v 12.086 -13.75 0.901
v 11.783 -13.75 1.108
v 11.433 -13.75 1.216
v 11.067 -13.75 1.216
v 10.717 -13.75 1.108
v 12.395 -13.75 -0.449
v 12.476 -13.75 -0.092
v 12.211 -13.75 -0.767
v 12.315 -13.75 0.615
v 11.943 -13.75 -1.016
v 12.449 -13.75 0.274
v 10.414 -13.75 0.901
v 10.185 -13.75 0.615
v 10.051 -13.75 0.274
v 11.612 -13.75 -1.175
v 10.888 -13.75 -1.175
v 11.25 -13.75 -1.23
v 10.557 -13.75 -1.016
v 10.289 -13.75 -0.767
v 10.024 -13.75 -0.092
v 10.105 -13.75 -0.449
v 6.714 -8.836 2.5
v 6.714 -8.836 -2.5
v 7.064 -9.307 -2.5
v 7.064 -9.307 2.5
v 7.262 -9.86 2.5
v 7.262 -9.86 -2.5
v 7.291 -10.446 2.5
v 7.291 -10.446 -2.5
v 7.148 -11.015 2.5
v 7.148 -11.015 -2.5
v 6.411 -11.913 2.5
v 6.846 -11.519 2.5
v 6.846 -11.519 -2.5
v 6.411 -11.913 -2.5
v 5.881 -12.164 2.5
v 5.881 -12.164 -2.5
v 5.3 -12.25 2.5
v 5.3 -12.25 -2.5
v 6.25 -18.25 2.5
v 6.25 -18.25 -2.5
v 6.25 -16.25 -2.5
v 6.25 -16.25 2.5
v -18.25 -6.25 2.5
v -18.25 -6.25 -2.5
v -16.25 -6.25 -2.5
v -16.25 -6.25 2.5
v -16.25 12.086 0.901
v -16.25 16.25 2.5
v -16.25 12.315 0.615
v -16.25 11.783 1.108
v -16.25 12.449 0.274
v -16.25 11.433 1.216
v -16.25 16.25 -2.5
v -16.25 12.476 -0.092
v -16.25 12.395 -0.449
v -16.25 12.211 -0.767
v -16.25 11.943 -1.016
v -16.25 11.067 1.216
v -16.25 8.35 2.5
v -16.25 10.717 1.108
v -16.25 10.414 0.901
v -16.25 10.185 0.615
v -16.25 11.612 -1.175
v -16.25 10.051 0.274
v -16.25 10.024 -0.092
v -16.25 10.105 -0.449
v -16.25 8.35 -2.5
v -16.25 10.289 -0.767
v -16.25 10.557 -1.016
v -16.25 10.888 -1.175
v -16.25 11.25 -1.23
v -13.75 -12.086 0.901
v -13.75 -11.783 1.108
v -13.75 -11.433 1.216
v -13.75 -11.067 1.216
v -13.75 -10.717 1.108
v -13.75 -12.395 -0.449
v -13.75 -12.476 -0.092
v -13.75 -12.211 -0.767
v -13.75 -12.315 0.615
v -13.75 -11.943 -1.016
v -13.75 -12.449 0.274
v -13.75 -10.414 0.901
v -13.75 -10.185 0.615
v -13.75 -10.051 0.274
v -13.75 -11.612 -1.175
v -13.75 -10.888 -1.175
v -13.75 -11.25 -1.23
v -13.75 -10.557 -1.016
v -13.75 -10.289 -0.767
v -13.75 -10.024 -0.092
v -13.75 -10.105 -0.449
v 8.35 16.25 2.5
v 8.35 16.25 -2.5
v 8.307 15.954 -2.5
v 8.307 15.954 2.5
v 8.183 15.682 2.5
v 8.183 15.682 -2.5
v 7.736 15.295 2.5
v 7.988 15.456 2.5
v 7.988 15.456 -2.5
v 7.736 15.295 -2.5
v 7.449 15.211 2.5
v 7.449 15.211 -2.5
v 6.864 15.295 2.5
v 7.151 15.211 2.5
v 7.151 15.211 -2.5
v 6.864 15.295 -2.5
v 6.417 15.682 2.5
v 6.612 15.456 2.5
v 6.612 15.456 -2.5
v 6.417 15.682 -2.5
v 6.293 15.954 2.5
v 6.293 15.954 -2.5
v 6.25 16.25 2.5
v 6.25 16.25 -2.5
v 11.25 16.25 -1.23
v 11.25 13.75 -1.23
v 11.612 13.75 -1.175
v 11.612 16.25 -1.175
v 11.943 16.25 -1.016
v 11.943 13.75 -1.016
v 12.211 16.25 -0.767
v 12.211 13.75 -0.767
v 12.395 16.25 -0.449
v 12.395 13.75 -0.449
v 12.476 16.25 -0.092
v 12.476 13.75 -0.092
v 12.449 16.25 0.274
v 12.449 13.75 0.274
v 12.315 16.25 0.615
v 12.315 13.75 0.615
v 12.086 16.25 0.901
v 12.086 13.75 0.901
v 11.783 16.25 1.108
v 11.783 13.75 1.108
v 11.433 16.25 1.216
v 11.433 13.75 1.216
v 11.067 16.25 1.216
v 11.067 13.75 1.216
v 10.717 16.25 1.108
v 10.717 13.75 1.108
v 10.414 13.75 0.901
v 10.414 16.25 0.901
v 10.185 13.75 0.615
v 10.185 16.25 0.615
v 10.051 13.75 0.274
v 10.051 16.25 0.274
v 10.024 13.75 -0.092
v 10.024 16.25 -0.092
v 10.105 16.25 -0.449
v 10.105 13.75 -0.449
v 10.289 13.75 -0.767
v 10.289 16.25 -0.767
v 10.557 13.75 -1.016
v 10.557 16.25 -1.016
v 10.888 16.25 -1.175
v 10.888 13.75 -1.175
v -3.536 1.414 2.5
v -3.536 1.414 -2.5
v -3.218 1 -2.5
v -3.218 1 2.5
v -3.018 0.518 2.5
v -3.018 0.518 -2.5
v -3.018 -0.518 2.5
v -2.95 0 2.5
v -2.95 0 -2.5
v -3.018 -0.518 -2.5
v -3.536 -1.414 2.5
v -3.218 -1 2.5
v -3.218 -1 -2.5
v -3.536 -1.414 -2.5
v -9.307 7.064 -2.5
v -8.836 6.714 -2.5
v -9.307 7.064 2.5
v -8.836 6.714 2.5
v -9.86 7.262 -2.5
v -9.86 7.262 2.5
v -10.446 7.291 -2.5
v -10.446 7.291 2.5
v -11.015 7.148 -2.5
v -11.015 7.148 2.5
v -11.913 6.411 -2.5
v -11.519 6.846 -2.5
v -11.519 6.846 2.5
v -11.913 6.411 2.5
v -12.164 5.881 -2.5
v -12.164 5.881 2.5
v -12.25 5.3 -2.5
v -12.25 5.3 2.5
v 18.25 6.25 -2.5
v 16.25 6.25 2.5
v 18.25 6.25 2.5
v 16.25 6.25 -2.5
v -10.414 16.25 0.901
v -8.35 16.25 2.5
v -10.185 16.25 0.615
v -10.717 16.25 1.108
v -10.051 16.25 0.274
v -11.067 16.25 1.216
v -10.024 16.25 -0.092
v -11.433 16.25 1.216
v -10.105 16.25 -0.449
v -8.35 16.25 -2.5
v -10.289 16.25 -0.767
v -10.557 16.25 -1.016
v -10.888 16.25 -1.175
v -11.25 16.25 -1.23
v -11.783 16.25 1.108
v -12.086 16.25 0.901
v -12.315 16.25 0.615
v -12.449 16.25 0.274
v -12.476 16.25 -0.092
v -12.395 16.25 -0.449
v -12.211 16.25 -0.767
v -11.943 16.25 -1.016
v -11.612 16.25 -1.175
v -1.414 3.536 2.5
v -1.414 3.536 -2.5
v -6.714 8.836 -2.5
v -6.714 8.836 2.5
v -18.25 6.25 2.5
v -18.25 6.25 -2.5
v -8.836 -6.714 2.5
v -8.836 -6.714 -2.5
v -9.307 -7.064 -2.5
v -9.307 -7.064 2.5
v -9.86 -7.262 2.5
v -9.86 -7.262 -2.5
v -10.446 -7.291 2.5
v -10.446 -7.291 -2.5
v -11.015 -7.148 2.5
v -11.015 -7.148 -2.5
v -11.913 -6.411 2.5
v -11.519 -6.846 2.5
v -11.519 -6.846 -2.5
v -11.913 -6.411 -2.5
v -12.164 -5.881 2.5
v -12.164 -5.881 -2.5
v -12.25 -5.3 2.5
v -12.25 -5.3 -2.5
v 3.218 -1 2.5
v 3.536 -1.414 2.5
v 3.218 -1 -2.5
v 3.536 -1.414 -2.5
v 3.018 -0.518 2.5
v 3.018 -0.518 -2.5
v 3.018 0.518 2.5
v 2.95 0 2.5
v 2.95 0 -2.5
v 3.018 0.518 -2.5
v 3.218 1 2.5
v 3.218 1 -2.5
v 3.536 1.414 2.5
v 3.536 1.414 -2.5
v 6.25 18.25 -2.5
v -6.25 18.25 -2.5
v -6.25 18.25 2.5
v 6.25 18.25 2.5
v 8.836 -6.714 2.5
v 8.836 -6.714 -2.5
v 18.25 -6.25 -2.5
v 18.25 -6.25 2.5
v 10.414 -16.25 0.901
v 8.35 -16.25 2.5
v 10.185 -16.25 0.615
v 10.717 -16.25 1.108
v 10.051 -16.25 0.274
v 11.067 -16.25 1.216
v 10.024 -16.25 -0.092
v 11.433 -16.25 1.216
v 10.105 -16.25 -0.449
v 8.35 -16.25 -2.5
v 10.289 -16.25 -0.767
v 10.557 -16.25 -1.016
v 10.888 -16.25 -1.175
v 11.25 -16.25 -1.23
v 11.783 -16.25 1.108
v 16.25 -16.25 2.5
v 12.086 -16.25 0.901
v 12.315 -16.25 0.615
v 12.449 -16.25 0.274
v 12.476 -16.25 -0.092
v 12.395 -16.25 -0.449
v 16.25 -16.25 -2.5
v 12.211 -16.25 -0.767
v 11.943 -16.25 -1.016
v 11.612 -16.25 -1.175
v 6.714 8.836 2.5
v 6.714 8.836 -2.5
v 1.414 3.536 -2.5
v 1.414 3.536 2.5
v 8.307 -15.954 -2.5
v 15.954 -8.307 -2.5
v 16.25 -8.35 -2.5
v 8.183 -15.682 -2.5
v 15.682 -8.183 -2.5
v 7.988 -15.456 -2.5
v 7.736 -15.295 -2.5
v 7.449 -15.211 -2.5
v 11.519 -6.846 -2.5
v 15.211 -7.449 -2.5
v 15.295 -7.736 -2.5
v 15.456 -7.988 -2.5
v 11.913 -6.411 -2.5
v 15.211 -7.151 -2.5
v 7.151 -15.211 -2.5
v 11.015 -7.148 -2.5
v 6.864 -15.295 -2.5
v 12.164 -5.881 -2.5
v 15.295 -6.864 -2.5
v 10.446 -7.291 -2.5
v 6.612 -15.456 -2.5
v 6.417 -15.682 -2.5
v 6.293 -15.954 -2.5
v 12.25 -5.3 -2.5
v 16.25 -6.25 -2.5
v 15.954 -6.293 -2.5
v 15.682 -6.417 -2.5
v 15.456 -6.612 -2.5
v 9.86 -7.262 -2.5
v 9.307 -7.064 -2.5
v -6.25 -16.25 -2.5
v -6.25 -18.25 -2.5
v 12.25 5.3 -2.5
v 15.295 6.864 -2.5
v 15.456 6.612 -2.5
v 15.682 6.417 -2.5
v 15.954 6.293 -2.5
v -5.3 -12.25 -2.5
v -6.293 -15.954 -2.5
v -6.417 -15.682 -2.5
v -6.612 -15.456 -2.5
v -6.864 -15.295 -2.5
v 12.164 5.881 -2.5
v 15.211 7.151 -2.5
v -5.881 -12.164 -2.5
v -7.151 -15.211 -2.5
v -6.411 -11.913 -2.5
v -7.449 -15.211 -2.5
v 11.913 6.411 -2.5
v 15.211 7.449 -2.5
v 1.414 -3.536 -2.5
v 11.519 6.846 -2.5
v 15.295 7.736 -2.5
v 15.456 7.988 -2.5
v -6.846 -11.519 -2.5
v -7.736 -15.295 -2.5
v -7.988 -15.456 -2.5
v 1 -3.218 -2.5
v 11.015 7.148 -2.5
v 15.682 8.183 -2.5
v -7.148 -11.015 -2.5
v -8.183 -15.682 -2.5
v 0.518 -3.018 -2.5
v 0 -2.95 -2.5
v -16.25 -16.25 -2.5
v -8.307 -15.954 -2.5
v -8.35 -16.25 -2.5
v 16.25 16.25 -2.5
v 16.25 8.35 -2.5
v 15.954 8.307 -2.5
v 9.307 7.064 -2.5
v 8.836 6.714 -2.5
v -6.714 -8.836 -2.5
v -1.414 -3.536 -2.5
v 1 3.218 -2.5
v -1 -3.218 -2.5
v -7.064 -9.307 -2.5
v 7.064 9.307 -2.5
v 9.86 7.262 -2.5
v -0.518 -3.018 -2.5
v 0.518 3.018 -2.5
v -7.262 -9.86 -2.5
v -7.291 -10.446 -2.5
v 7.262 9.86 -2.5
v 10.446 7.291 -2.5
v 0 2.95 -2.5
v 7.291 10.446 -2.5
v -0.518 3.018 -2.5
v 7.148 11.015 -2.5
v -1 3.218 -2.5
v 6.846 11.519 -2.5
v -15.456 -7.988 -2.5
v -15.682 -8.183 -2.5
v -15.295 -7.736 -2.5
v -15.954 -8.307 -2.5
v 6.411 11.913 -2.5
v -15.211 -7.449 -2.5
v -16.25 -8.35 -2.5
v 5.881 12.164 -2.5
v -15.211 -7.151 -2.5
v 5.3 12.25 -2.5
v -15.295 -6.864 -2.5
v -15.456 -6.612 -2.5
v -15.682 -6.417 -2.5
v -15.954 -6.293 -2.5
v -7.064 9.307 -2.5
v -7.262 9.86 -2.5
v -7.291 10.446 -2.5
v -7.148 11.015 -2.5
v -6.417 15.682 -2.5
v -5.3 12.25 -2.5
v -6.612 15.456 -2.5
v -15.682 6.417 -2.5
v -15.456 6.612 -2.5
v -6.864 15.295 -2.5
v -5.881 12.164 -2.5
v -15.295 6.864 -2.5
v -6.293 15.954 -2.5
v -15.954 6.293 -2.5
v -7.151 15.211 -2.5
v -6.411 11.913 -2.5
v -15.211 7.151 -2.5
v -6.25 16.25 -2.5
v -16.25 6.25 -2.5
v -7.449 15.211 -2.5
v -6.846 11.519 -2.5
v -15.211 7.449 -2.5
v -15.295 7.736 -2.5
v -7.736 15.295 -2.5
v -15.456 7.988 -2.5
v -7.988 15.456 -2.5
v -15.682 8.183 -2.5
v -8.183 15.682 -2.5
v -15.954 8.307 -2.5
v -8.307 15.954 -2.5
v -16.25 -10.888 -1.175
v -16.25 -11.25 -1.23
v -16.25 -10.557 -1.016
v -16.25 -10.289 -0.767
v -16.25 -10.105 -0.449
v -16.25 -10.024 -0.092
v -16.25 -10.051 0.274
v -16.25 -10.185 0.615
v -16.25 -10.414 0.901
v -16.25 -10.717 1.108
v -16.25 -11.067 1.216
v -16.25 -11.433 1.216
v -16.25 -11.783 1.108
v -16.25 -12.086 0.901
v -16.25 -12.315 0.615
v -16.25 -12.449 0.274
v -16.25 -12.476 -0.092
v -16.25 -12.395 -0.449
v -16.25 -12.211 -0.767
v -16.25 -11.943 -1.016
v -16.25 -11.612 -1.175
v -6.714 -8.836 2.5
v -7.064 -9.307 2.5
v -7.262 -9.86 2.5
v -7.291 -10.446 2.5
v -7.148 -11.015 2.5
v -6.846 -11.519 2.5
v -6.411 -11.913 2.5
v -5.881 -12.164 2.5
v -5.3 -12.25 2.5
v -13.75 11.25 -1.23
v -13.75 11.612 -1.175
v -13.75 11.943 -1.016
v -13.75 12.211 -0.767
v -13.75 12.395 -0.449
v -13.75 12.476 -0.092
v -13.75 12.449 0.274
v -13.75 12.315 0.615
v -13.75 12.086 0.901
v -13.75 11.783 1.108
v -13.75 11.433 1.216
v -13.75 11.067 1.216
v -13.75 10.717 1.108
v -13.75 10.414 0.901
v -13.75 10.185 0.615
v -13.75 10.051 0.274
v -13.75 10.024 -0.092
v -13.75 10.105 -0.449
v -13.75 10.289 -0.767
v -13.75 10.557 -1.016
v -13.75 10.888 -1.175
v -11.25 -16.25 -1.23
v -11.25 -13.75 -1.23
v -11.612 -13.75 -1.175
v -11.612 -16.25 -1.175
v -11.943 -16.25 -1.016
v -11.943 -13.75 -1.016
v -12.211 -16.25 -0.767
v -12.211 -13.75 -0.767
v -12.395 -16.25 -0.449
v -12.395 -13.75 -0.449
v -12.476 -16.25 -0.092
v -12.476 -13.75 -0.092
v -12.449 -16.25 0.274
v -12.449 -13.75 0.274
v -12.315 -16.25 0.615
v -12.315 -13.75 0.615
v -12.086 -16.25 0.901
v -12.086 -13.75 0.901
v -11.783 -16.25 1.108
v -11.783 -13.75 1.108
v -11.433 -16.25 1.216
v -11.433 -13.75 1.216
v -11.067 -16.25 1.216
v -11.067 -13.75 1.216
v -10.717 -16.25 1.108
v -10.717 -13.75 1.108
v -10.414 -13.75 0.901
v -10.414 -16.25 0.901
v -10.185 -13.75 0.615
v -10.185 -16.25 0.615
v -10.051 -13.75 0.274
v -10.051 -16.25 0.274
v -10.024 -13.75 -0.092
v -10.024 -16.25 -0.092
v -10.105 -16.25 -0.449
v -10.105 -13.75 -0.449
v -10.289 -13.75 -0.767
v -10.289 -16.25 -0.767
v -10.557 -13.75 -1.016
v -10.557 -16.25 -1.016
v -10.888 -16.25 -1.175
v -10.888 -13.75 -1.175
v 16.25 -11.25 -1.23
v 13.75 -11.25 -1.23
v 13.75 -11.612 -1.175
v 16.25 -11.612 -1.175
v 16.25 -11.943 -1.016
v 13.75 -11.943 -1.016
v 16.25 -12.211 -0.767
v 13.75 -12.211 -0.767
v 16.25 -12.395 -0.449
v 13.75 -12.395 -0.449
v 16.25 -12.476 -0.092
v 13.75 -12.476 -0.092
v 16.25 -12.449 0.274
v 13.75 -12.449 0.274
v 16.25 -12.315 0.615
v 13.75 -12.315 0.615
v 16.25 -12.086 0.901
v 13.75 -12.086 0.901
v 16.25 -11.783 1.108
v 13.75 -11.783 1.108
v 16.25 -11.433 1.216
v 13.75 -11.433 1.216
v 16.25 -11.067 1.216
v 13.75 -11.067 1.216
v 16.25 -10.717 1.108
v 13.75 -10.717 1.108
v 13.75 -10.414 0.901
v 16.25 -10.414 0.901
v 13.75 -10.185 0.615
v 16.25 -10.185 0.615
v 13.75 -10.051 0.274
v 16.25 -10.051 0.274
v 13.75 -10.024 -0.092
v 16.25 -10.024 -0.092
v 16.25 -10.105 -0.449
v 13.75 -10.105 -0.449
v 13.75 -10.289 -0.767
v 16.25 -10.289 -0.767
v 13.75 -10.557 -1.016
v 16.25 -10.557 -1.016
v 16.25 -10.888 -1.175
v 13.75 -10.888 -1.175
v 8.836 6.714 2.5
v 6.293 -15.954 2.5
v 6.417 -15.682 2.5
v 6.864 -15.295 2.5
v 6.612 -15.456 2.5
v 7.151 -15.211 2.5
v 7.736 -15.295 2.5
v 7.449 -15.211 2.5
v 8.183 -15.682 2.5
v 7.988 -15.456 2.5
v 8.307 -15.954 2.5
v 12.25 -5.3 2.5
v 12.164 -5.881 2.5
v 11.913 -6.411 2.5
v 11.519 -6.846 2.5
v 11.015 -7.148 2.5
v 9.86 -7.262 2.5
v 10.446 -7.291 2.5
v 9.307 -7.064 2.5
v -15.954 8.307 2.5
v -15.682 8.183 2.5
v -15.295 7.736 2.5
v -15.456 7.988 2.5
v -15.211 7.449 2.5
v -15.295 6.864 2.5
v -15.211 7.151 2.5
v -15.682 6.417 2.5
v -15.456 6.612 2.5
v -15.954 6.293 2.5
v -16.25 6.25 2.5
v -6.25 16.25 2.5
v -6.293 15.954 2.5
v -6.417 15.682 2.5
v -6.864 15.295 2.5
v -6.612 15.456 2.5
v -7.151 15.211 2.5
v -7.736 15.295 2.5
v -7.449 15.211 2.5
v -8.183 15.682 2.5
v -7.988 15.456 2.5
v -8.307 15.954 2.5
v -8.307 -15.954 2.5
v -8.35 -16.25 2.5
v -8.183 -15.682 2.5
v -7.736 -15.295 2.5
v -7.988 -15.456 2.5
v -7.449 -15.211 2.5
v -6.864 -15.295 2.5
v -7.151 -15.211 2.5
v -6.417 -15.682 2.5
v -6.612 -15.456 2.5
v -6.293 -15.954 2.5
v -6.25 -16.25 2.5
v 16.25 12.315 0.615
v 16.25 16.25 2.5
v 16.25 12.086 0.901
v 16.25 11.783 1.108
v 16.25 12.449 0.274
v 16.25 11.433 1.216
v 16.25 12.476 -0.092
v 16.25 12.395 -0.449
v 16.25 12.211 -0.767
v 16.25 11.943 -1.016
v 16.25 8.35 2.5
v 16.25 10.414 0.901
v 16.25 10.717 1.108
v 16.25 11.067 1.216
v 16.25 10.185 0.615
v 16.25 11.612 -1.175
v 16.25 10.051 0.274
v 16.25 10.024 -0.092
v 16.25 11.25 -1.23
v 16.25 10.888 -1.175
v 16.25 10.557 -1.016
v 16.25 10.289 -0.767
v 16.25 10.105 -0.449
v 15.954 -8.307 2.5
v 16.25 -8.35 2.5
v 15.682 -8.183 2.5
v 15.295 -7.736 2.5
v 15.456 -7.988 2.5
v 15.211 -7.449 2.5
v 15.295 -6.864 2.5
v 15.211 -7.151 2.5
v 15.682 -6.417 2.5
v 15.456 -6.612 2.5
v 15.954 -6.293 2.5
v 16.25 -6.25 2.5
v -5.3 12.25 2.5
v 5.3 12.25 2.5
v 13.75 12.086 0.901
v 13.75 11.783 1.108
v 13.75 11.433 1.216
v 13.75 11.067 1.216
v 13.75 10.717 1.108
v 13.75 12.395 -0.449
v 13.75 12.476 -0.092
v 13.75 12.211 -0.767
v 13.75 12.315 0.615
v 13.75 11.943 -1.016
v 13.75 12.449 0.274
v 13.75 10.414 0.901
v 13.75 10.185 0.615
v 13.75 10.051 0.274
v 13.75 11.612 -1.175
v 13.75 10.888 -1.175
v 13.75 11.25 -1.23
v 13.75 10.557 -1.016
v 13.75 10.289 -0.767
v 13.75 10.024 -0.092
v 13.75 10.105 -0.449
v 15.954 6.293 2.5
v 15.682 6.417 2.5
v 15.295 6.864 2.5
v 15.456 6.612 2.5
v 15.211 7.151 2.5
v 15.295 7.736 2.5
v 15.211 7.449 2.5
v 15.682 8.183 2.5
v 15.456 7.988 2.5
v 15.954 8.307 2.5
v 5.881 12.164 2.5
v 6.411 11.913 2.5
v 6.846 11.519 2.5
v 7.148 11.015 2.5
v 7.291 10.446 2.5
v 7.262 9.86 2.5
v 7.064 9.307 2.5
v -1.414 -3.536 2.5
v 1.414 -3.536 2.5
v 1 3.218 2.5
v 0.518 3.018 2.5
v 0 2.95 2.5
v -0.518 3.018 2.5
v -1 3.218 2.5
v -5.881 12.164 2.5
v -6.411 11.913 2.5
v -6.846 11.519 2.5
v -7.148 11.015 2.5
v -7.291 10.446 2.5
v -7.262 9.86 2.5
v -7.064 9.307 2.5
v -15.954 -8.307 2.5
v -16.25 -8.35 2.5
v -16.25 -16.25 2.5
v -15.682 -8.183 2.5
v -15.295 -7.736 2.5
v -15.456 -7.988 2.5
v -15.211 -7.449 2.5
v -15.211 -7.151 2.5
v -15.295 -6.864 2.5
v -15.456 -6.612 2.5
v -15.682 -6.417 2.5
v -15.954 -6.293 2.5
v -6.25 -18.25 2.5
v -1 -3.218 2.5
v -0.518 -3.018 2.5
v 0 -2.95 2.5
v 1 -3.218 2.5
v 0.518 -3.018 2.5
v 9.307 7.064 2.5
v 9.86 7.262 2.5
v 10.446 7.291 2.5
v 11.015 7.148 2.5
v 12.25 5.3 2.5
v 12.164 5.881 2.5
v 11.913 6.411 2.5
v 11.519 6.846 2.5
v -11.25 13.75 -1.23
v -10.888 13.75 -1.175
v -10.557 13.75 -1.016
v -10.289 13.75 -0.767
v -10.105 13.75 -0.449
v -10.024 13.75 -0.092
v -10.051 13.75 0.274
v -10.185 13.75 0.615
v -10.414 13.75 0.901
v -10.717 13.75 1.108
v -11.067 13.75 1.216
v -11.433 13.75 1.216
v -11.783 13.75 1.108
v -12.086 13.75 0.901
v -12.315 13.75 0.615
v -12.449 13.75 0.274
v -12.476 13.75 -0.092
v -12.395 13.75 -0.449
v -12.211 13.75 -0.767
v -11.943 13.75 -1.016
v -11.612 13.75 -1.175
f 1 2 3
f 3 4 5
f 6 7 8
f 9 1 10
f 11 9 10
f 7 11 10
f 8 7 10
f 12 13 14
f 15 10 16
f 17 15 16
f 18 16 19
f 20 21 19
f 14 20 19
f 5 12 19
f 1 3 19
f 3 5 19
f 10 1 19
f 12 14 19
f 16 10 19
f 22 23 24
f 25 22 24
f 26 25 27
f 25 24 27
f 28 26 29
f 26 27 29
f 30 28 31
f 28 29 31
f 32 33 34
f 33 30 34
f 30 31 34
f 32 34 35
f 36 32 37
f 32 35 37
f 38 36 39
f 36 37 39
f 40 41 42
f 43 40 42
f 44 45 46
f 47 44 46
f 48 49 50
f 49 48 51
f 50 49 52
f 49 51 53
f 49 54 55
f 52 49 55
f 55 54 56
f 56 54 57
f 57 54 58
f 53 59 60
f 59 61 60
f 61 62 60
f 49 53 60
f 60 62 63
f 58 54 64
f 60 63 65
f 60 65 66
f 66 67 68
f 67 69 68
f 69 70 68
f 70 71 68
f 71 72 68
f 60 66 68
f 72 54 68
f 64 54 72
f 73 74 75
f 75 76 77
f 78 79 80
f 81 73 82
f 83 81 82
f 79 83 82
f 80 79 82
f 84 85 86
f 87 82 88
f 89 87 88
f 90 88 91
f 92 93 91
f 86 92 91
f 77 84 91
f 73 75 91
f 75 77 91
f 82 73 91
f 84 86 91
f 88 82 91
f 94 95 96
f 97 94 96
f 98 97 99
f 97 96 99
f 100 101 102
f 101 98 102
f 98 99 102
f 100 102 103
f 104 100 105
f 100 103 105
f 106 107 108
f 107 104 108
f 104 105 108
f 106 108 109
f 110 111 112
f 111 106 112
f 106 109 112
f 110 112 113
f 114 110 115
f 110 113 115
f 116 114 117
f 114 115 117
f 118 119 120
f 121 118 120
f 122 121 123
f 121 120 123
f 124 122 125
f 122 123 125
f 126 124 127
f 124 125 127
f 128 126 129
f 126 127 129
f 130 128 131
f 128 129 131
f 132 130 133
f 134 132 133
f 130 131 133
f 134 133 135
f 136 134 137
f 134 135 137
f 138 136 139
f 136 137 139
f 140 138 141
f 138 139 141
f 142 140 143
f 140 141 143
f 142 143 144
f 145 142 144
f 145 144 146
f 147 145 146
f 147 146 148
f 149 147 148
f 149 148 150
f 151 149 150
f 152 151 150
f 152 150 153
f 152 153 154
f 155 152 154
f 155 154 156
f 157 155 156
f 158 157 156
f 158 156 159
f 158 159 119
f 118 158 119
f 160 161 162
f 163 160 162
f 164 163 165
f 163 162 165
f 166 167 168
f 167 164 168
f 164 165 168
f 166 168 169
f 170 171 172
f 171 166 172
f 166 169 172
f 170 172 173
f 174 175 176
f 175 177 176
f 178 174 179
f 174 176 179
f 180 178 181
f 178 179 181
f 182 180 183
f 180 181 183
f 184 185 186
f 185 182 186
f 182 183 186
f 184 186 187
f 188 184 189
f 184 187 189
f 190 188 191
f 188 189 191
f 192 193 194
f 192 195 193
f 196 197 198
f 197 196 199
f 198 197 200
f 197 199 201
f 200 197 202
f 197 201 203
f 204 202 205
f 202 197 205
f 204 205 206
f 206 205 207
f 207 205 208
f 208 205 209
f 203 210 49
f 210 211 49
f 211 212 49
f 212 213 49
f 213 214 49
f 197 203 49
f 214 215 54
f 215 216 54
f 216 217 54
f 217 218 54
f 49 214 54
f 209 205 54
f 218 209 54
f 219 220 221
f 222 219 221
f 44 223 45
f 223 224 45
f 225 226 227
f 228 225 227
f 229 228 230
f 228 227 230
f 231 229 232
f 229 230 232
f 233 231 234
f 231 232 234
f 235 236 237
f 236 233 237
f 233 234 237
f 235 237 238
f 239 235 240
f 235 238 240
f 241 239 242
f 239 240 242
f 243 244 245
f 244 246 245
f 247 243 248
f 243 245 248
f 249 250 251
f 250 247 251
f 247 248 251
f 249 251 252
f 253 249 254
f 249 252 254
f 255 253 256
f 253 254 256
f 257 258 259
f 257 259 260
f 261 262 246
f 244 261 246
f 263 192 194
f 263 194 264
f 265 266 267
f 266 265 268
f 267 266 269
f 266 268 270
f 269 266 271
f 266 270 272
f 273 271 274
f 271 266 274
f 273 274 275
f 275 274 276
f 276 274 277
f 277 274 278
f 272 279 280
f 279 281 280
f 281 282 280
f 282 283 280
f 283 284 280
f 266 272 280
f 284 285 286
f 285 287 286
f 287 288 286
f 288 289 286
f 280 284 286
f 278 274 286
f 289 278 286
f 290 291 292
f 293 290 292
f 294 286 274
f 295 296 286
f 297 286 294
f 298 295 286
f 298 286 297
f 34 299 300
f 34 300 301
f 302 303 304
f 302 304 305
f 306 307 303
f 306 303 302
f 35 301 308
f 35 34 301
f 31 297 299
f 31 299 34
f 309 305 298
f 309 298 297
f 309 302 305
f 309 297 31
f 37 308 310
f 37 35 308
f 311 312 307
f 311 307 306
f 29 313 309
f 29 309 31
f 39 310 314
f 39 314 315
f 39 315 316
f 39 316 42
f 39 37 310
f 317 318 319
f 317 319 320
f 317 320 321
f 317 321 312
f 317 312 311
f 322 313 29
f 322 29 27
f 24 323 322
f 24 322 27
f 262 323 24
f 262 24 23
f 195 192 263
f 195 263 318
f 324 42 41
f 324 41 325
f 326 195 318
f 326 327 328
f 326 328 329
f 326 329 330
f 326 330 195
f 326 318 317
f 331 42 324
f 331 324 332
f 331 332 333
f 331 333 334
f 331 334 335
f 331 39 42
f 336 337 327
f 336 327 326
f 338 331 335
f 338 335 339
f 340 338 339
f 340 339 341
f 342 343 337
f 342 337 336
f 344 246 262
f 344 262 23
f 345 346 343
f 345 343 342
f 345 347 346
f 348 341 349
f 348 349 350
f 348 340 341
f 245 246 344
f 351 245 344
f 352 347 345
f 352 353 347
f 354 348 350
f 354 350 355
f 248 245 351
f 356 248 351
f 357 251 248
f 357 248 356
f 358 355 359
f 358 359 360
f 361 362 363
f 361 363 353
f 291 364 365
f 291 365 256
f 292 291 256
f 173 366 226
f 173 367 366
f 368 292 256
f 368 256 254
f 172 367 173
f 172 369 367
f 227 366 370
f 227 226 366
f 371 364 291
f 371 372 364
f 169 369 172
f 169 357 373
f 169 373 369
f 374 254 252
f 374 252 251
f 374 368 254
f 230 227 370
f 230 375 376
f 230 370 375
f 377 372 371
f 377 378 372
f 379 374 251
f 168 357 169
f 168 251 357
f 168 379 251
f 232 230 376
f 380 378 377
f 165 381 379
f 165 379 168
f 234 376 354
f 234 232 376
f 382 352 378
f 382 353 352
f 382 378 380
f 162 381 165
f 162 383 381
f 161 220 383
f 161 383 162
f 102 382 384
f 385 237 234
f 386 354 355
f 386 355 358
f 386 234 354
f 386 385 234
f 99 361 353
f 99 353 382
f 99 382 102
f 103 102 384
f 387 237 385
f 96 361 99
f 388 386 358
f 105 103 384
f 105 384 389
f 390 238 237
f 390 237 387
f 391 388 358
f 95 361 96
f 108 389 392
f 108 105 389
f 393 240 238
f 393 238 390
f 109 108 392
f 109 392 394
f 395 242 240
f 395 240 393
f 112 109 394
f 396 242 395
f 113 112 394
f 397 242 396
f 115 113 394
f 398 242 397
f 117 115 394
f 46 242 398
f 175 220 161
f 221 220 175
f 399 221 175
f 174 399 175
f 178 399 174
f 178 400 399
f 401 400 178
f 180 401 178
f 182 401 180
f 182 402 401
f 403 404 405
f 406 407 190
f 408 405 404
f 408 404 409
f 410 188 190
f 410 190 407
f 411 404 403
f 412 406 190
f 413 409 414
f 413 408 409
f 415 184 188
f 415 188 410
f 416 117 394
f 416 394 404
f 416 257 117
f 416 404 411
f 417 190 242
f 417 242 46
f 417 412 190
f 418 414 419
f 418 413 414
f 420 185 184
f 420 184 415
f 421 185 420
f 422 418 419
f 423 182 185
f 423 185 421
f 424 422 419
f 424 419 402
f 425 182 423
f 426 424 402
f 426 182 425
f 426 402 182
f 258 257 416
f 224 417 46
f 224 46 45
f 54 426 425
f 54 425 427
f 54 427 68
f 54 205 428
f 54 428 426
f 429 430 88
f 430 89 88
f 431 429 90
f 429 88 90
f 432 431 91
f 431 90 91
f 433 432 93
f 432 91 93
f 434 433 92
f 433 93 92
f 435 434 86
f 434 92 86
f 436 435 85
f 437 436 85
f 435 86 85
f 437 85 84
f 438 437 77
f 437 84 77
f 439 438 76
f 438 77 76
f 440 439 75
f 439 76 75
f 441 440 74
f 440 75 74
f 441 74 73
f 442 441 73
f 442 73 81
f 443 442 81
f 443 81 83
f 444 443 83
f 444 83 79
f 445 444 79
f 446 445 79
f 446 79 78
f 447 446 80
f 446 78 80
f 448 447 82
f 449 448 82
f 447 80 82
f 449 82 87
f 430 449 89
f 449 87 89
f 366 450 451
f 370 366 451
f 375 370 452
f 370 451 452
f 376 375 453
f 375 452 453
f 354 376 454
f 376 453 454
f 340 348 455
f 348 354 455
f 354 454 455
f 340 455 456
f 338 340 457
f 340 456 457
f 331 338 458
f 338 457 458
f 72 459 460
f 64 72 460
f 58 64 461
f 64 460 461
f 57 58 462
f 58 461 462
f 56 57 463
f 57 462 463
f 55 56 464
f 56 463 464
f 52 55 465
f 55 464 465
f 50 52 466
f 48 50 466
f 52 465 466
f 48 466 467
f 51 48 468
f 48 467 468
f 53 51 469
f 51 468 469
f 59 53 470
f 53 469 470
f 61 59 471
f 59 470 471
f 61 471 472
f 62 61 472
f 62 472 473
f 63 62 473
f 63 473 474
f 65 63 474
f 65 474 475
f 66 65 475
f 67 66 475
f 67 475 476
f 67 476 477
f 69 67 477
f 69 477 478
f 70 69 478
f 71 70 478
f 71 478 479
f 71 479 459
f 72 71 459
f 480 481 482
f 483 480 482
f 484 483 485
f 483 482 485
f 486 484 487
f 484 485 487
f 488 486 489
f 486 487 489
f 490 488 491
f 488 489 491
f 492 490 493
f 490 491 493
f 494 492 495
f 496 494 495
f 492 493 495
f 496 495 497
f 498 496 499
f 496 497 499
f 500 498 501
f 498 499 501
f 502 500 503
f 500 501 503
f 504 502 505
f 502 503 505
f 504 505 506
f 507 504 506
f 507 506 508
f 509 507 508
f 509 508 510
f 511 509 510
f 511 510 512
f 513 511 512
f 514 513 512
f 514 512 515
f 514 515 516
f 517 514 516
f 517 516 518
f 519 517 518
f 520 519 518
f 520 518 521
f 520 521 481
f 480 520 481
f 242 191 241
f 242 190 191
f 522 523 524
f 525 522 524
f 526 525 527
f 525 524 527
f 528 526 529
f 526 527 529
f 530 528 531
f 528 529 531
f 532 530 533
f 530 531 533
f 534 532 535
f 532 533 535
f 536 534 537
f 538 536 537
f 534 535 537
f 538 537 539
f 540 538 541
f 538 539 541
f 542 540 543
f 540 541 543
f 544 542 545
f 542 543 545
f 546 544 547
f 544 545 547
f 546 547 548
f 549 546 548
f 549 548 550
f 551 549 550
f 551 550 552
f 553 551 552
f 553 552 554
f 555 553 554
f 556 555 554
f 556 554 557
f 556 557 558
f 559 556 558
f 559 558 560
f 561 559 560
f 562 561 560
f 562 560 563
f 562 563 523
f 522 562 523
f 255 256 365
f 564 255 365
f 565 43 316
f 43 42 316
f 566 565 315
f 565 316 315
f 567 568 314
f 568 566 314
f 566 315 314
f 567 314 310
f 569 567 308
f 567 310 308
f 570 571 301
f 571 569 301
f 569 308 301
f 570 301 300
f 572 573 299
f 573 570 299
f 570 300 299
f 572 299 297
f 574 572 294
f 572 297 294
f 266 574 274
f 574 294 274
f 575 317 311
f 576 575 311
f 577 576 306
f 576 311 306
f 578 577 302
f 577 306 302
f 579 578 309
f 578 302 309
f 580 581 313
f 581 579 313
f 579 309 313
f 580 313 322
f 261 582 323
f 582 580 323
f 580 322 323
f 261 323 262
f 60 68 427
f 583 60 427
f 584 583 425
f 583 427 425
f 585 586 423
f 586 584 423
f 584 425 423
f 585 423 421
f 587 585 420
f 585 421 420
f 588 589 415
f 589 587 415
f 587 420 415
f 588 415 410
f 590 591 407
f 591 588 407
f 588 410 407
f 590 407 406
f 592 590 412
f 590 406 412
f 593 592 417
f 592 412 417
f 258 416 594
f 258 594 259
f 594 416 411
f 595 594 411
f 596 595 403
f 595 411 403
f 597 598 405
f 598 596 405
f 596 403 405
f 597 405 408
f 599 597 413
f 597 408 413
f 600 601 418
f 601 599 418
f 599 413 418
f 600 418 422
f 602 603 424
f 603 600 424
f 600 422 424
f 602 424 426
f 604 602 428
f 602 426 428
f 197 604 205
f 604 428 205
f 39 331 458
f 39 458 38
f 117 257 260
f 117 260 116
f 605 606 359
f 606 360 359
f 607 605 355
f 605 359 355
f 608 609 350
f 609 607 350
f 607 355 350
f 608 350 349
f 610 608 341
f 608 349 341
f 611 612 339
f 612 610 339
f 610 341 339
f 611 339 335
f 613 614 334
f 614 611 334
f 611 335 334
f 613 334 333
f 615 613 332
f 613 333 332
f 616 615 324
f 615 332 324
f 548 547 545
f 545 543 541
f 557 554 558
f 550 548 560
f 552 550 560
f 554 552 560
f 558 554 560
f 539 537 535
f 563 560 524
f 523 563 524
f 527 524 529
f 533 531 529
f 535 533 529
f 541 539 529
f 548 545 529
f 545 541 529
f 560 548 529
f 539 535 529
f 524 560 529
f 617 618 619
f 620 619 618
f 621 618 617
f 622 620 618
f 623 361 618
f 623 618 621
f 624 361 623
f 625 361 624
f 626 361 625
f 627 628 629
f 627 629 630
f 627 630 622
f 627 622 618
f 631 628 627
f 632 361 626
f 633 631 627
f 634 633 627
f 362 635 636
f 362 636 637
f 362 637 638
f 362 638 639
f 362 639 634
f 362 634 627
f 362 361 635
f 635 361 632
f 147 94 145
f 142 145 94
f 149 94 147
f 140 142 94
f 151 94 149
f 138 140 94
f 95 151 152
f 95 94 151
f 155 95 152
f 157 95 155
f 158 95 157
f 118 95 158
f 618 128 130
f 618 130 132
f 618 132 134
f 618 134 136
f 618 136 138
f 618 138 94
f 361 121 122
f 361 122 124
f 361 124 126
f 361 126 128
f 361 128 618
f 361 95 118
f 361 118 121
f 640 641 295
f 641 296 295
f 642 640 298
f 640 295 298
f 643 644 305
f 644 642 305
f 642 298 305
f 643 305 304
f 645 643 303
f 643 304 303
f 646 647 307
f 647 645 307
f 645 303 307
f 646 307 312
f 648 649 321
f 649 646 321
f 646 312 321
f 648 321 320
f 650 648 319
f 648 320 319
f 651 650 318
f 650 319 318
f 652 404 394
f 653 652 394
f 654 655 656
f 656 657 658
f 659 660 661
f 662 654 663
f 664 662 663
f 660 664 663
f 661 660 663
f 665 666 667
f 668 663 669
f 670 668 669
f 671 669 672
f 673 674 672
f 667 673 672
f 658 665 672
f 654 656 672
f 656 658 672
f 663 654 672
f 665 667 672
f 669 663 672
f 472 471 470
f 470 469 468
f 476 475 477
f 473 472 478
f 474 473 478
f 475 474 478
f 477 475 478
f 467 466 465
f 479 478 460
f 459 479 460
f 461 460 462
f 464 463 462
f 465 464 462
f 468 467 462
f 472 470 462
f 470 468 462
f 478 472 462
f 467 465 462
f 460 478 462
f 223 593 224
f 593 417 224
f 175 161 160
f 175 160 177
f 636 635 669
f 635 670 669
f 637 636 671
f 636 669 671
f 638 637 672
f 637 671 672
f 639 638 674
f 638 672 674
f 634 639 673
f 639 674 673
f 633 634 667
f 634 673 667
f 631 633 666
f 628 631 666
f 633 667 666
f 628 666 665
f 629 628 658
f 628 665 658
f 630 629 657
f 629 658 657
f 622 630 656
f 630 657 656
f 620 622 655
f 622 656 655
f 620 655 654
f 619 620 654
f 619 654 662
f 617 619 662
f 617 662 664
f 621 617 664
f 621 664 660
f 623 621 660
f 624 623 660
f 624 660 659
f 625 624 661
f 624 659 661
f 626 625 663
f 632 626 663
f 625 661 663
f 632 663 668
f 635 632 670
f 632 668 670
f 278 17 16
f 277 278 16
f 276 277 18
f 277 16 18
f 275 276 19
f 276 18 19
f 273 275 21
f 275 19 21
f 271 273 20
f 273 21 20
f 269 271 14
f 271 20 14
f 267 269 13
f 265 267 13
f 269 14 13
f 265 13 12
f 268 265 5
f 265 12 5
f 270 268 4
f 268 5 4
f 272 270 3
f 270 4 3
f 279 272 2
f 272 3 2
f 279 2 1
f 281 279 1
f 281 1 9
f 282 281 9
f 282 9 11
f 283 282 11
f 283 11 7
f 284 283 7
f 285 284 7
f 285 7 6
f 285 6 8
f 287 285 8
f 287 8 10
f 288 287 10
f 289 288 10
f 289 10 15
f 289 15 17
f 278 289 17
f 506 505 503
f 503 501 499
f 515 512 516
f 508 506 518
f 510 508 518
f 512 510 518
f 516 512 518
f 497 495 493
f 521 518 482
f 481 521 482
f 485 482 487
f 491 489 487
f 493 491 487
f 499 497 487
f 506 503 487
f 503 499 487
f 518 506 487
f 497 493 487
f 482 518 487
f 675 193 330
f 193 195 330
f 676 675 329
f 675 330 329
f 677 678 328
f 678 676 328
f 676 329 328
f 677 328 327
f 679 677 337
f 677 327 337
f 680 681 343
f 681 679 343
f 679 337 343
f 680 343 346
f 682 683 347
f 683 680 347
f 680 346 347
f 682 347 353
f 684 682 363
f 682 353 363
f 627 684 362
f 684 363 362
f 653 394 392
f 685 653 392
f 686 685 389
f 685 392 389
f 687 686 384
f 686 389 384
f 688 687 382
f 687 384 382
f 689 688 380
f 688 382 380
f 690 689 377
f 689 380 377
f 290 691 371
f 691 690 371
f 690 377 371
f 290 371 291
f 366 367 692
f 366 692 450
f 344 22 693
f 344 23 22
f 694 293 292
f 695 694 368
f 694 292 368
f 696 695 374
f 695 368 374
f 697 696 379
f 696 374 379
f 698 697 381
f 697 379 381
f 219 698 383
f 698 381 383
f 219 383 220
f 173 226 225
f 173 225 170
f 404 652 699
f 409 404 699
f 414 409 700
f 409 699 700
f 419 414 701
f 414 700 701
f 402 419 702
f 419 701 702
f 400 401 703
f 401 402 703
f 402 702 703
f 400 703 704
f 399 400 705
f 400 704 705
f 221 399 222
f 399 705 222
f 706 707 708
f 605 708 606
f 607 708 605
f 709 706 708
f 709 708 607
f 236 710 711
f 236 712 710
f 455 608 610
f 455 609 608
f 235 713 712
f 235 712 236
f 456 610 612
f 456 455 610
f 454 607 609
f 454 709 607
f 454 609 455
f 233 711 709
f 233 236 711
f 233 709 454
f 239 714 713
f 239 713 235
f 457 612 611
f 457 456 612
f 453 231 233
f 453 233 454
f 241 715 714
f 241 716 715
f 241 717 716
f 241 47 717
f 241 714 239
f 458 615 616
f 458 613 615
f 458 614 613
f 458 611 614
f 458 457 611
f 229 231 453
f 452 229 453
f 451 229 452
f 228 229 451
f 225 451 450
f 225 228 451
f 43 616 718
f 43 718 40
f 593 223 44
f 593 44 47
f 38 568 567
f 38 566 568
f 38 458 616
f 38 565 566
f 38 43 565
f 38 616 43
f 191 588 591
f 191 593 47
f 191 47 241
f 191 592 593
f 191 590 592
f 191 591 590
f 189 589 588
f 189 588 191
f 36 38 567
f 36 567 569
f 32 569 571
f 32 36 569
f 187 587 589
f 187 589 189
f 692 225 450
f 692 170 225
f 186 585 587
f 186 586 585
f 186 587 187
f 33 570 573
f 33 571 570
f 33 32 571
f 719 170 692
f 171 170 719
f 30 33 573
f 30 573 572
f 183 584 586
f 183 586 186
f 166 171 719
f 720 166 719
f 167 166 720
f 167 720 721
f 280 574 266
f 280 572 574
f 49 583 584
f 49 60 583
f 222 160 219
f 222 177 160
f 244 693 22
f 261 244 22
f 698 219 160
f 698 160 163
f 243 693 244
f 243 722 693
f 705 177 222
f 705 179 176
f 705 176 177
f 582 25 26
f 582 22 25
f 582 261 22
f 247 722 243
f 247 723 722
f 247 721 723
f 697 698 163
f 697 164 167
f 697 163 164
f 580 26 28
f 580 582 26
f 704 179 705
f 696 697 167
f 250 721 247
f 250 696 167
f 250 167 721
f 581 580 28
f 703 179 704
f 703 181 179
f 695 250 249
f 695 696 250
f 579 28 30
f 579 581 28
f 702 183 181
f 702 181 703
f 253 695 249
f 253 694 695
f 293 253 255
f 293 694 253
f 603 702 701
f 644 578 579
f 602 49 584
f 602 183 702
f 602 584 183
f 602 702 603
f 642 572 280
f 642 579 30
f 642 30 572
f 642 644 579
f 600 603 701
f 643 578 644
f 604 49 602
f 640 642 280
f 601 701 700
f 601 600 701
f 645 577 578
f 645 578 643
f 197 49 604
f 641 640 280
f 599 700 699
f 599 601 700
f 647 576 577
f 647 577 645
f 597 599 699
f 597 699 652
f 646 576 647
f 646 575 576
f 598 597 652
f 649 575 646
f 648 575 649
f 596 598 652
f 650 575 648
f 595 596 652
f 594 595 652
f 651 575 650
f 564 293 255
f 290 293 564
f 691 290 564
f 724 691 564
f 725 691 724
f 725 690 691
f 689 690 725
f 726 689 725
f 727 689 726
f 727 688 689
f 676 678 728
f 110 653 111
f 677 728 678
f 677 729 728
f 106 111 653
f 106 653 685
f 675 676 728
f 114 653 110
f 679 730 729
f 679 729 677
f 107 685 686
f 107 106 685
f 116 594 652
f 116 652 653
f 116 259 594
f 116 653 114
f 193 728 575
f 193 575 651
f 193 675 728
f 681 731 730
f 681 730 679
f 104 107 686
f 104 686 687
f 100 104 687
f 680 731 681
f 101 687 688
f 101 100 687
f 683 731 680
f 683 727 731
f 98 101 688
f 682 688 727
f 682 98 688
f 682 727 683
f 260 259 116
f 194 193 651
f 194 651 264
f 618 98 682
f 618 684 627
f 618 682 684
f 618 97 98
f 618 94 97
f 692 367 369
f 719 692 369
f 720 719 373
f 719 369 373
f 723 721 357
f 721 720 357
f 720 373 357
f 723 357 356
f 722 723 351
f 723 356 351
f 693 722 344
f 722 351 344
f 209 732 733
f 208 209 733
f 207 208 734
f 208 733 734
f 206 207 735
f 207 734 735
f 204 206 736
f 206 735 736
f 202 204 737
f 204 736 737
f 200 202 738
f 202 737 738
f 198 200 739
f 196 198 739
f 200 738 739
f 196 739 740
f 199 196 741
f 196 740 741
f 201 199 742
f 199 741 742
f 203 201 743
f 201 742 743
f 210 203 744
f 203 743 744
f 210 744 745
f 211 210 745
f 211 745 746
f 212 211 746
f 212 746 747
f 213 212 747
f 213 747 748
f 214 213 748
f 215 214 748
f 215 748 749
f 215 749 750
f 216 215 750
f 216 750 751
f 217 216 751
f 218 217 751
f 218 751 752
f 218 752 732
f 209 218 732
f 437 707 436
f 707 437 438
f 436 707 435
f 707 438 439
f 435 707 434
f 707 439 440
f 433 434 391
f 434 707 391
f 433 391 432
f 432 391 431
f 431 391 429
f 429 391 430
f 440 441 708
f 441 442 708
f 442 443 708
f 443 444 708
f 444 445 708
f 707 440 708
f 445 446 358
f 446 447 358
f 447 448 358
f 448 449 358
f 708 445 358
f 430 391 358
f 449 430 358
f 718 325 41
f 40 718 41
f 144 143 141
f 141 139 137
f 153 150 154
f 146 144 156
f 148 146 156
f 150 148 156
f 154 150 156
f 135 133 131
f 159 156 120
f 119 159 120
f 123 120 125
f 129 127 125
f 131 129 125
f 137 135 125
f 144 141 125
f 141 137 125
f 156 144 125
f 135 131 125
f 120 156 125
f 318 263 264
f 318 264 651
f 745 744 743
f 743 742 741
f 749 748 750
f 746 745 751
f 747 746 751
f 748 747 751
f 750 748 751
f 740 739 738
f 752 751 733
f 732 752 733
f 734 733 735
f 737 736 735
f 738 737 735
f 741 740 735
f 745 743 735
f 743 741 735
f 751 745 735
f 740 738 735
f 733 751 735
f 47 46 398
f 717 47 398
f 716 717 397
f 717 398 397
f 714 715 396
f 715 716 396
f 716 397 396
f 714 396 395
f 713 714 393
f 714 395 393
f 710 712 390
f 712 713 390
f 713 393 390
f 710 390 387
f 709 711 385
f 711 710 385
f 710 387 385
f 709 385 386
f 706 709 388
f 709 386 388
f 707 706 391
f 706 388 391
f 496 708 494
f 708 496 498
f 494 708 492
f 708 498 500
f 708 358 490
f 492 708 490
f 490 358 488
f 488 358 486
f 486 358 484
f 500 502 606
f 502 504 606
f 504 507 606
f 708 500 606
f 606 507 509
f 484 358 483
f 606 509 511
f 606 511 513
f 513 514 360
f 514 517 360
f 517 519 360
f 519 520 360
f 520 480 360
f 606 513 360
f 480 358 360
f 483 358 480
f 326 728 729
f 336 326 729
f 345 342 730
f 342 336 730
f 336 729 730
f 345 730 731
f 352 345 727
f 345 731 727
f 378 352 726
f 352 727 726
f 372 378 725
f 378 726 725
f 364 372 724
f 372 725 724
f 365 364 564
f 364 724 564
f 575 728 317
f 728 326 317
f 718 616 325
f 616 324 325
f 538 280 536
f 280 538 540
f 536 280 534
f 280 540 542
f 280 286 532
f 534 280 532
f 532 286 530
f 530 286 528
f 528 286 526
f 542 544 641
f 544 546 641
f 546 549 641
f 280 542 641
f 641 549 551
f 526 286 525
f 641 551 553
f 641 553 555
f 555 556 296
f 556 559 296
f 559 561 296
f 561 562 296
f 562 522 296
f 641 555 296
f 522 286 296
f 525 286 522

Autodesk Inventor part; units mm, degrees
ref_plane "YZ Plane" through (0, 0, 0) normal (1, 0, 0) x (0, 1, 0)
ref_plane "XZ Plane" through (0, 0, 0) normal (0, 1, 0) x (-1, 0, 0)
ref_plane "XY Plane" through (0, 0, 0) normal (0, 0, 1) x (1, 0, 0)
sketch "スケッチ1" plane through (0, 0, 0) normal (0, 0, 1) x (1, 0, 0)
  line L0 (-16.25, -16.25) -> (16.25, -16.25) construction
  line L1 (16.25, -16.25) -> (16.25, 16.25) construction
  line L2 (16.25, 16.25) -> (-16.25, 16.25) construction
  line L3 (-16.25, 16.25) -> (-16.25, -16.25) construction
  line L4 (-16.25, -16.25) -> (16.25, 16.25) construction
  line L5 (16.25, -16.25) -> (-16.25, 16.25) construction
  line L6 (-8.35, 16.25) -> (-16.25, 16.25)
  line L7 (-16.25, 16.25) -> (-16.25, 8.35)
  line L8 (8.35, 16.25) -> (16.25, 16.25)
  line L9 (16.25, 16.25) -> (16.25, 8.35)
  line L10 (-16.25, -8.35) -> (-16.25, -16.25)
  line L11 (-16.25, -16.25) -> (-8.35, -16.25)
  line L12 (8.35, -16.25) -> (16.25, -16.25)
  line L13 (16.25, -16.25) -> (16.25, -8.35)
  line L14 (-6.25, 16.25) -> (-6.25, 18.25)
  line L15 (-6.25, 18.25) -> (6.25, 18.25)
  line L16 (6.25, 18.25) -> (6.25, 16.25)
  arc A0 (-8.35, 16.25) -> (-6.25, 16.25) centre (-7.3, 16.25) ccw
  arc A1 (6.25, 16.25) -> (8.35, 16.25) centre (7.3, 16.25) ccw
  line L17 (0, 16.25) -> (0, 0) construction
  line L18 (0, 0) -> (16.25, 0) construction
  line L19 (-16.25, 6.25) -> (-18.25, 6.25)
  line L20 (-18.25, 6.25) -> (-18.25, -6.25)
  line L21 (-18.25, -6.25) -> (-16.25, -6.25)
  arc A2 (-16.25, 6.25) -> (-16.25, 8.35) centre (-16.25, 7.3) ccw
  arc A3 (-16.25, -8.35) -> (-16.25, -6.25) centre (-16.25, -7.3) ccw
  line L22 (-6.25, -16.25) -> (-6.25, -18.25)
  line L23 (-6.25, -18.25) -> (6.25, -18.25)
  line L24 (6.25, -18.25) -> (6.25, -16.25)
  arc A4 (-6.25, -16.25) -> (-8.35, -16.25) centre (-7.3, -16.25) ccw
  arc A5 (8.35, -16.25) -> (6.25, -16.25) centre (7.3, -16.25) ccw
  line L25 (16.25, 6.25) -> (18.25, 6.25)
  line L26 (18.25, 6.25) -> (18.25, -6.25)
  line L27 (18.25, -6.25) -> (16.25, -6.25)
  arc A6 (16.25, 8.35) -> (16.25, 6.25) centre (16.25, 7.3) ccw
  arc A7 (16.25, -6.25) -> (16.25, -8.35) centre (16.25, -7.3) ccw
  line L28 (-12.8, 16.25) -> (-9.7, 16.25) construction
  line L29 (-9.7, 16.25) -> (-9.7, 13.25) construction
  line L30 (-9.7, 13.25) -> (-12.8, 13.25) construction
  line L31 (-12.8, 13.25) -> (-12.8, 16.25) construction
  line L32 (-16.25, 12.8) -> (-13.25, 12.8) construction
  line L33 (-13.25, 12.8) -> (-13.25, 9.7) construction
  line L34 (-13.25, 9.7) -> (-16.25, 9.7) construction
  line L35 (-16.25, 9.7) -> (-16.25, 12.8) construction
  line L36 (-10.1287, 12.25) -> (10.1287, 12.25)
  line L37 (10.1287, 12.25) -> (0, 2.1213)
  line L38 (0, 2.1213) -> (-10.1287, 12.25)
  line L39 (-12.25, 10.1287) -> (-12.25, -10.1287)
  line L40 (-12.25, -10.1287) -> (-2.1213, 0)
  line L41 (-2.1213, 0) -> (-12.25, 10.1287)
  line L42 (-10.1287, -12.25) -> (10.1287, -12.25)
  line L43 (10.1287, -12.25) -> (0, -2.1213)
  line L44 (0, -2.1213) -> (-10.1287, -12.25)
  line L45 (12.25, 10.1287) -> (12.25, -10.1287)
  line L46 (12.25, -10.1287) -> (2.1213, 0)
  line L47 (2.1213, 0) -> (12.25, 10.1287)
  line L48 (-11.25, 16.25) -> (-11.25, 13.25) construction
  line L49 (-13.25, 11.25) -> (-16.25, 11.25) construction
  dimension "d0" = 32.5
  dimension "d1" = 1.05
  dimension "d2" = 2
  dimension "d3" = 10
  dimension "d4" = 3.1
  dimension "d6" = 3
  dimension "d8" = 3
  dimension "d9" = 3
  dimension "d10" = 3
  dimension "d11" = 3
  dimension "d12" = 3
  dimension "d13" = 4
  dimension "d17" = 5
  dimension "d18" = 5
extrude "押し出し1" add sketch "スケッチ1" along normal blind 2.5
mirror "ミラー1" about plane through (0, 0, 0) normal (0, 0, -1) of "押し出し1"
sketch "スケッチ2" plane through (-16.25, -16.25, 2.5) normal (0, -1, 0) x (1, 0, 0)
  line L0 (0, -5) -> (0, 0) projected
  line L1 (10, 0) -> (22.5, 0) construction
  line L2 (16.25, 0) -> (16.25, -5) construction
  point P0 (16.25, -2.5)
  point P1 (5, -2.5)
  point P2 (27.5, -2.5)
  point P3 (0, -2.5)
  dimension "d19" = 5
hole "穴1" at (-11.25, -16.25, 0) at (11.25, -16.25, 0) direction (0, 1, 0) diameter 2.459 depth 2.5 thread size "M3x0.5" class "6H" standard "ISO Metric profile"
pattern_circular "円形状パターン1" count 4 over 360 about axis through (0, 0, -10) along (0, 0, 1) of "穴1"
fillet "フィレット1" radius 2 12 edges at (12.25, 10.1287, 0) (12.25, -10.1287, 0) (10.1287, -12.25, 0) (0, 2.1213, 0) (-2.1213, 0, 0) (-10.1287, -12.25, 0) (-12.25, -10.1287, 0) (10.1287, 12.25, 0) (-12.25, 10.1287, 0) (-10.1287, 12.25, 0) (0, -2.1213, 0) (2.1213, 0, 0)
equation "\"d8\" = d6"
equation "\"d10\" = d9"
equation "\"d11\" = d10"
equation "\"d12\" = d11"
equation "\"d18\" = d17"
equation "\"d19\" = d17"
properties part number "上腕_メインフレーム_1_1" material "アセタール樹脂、黒"
